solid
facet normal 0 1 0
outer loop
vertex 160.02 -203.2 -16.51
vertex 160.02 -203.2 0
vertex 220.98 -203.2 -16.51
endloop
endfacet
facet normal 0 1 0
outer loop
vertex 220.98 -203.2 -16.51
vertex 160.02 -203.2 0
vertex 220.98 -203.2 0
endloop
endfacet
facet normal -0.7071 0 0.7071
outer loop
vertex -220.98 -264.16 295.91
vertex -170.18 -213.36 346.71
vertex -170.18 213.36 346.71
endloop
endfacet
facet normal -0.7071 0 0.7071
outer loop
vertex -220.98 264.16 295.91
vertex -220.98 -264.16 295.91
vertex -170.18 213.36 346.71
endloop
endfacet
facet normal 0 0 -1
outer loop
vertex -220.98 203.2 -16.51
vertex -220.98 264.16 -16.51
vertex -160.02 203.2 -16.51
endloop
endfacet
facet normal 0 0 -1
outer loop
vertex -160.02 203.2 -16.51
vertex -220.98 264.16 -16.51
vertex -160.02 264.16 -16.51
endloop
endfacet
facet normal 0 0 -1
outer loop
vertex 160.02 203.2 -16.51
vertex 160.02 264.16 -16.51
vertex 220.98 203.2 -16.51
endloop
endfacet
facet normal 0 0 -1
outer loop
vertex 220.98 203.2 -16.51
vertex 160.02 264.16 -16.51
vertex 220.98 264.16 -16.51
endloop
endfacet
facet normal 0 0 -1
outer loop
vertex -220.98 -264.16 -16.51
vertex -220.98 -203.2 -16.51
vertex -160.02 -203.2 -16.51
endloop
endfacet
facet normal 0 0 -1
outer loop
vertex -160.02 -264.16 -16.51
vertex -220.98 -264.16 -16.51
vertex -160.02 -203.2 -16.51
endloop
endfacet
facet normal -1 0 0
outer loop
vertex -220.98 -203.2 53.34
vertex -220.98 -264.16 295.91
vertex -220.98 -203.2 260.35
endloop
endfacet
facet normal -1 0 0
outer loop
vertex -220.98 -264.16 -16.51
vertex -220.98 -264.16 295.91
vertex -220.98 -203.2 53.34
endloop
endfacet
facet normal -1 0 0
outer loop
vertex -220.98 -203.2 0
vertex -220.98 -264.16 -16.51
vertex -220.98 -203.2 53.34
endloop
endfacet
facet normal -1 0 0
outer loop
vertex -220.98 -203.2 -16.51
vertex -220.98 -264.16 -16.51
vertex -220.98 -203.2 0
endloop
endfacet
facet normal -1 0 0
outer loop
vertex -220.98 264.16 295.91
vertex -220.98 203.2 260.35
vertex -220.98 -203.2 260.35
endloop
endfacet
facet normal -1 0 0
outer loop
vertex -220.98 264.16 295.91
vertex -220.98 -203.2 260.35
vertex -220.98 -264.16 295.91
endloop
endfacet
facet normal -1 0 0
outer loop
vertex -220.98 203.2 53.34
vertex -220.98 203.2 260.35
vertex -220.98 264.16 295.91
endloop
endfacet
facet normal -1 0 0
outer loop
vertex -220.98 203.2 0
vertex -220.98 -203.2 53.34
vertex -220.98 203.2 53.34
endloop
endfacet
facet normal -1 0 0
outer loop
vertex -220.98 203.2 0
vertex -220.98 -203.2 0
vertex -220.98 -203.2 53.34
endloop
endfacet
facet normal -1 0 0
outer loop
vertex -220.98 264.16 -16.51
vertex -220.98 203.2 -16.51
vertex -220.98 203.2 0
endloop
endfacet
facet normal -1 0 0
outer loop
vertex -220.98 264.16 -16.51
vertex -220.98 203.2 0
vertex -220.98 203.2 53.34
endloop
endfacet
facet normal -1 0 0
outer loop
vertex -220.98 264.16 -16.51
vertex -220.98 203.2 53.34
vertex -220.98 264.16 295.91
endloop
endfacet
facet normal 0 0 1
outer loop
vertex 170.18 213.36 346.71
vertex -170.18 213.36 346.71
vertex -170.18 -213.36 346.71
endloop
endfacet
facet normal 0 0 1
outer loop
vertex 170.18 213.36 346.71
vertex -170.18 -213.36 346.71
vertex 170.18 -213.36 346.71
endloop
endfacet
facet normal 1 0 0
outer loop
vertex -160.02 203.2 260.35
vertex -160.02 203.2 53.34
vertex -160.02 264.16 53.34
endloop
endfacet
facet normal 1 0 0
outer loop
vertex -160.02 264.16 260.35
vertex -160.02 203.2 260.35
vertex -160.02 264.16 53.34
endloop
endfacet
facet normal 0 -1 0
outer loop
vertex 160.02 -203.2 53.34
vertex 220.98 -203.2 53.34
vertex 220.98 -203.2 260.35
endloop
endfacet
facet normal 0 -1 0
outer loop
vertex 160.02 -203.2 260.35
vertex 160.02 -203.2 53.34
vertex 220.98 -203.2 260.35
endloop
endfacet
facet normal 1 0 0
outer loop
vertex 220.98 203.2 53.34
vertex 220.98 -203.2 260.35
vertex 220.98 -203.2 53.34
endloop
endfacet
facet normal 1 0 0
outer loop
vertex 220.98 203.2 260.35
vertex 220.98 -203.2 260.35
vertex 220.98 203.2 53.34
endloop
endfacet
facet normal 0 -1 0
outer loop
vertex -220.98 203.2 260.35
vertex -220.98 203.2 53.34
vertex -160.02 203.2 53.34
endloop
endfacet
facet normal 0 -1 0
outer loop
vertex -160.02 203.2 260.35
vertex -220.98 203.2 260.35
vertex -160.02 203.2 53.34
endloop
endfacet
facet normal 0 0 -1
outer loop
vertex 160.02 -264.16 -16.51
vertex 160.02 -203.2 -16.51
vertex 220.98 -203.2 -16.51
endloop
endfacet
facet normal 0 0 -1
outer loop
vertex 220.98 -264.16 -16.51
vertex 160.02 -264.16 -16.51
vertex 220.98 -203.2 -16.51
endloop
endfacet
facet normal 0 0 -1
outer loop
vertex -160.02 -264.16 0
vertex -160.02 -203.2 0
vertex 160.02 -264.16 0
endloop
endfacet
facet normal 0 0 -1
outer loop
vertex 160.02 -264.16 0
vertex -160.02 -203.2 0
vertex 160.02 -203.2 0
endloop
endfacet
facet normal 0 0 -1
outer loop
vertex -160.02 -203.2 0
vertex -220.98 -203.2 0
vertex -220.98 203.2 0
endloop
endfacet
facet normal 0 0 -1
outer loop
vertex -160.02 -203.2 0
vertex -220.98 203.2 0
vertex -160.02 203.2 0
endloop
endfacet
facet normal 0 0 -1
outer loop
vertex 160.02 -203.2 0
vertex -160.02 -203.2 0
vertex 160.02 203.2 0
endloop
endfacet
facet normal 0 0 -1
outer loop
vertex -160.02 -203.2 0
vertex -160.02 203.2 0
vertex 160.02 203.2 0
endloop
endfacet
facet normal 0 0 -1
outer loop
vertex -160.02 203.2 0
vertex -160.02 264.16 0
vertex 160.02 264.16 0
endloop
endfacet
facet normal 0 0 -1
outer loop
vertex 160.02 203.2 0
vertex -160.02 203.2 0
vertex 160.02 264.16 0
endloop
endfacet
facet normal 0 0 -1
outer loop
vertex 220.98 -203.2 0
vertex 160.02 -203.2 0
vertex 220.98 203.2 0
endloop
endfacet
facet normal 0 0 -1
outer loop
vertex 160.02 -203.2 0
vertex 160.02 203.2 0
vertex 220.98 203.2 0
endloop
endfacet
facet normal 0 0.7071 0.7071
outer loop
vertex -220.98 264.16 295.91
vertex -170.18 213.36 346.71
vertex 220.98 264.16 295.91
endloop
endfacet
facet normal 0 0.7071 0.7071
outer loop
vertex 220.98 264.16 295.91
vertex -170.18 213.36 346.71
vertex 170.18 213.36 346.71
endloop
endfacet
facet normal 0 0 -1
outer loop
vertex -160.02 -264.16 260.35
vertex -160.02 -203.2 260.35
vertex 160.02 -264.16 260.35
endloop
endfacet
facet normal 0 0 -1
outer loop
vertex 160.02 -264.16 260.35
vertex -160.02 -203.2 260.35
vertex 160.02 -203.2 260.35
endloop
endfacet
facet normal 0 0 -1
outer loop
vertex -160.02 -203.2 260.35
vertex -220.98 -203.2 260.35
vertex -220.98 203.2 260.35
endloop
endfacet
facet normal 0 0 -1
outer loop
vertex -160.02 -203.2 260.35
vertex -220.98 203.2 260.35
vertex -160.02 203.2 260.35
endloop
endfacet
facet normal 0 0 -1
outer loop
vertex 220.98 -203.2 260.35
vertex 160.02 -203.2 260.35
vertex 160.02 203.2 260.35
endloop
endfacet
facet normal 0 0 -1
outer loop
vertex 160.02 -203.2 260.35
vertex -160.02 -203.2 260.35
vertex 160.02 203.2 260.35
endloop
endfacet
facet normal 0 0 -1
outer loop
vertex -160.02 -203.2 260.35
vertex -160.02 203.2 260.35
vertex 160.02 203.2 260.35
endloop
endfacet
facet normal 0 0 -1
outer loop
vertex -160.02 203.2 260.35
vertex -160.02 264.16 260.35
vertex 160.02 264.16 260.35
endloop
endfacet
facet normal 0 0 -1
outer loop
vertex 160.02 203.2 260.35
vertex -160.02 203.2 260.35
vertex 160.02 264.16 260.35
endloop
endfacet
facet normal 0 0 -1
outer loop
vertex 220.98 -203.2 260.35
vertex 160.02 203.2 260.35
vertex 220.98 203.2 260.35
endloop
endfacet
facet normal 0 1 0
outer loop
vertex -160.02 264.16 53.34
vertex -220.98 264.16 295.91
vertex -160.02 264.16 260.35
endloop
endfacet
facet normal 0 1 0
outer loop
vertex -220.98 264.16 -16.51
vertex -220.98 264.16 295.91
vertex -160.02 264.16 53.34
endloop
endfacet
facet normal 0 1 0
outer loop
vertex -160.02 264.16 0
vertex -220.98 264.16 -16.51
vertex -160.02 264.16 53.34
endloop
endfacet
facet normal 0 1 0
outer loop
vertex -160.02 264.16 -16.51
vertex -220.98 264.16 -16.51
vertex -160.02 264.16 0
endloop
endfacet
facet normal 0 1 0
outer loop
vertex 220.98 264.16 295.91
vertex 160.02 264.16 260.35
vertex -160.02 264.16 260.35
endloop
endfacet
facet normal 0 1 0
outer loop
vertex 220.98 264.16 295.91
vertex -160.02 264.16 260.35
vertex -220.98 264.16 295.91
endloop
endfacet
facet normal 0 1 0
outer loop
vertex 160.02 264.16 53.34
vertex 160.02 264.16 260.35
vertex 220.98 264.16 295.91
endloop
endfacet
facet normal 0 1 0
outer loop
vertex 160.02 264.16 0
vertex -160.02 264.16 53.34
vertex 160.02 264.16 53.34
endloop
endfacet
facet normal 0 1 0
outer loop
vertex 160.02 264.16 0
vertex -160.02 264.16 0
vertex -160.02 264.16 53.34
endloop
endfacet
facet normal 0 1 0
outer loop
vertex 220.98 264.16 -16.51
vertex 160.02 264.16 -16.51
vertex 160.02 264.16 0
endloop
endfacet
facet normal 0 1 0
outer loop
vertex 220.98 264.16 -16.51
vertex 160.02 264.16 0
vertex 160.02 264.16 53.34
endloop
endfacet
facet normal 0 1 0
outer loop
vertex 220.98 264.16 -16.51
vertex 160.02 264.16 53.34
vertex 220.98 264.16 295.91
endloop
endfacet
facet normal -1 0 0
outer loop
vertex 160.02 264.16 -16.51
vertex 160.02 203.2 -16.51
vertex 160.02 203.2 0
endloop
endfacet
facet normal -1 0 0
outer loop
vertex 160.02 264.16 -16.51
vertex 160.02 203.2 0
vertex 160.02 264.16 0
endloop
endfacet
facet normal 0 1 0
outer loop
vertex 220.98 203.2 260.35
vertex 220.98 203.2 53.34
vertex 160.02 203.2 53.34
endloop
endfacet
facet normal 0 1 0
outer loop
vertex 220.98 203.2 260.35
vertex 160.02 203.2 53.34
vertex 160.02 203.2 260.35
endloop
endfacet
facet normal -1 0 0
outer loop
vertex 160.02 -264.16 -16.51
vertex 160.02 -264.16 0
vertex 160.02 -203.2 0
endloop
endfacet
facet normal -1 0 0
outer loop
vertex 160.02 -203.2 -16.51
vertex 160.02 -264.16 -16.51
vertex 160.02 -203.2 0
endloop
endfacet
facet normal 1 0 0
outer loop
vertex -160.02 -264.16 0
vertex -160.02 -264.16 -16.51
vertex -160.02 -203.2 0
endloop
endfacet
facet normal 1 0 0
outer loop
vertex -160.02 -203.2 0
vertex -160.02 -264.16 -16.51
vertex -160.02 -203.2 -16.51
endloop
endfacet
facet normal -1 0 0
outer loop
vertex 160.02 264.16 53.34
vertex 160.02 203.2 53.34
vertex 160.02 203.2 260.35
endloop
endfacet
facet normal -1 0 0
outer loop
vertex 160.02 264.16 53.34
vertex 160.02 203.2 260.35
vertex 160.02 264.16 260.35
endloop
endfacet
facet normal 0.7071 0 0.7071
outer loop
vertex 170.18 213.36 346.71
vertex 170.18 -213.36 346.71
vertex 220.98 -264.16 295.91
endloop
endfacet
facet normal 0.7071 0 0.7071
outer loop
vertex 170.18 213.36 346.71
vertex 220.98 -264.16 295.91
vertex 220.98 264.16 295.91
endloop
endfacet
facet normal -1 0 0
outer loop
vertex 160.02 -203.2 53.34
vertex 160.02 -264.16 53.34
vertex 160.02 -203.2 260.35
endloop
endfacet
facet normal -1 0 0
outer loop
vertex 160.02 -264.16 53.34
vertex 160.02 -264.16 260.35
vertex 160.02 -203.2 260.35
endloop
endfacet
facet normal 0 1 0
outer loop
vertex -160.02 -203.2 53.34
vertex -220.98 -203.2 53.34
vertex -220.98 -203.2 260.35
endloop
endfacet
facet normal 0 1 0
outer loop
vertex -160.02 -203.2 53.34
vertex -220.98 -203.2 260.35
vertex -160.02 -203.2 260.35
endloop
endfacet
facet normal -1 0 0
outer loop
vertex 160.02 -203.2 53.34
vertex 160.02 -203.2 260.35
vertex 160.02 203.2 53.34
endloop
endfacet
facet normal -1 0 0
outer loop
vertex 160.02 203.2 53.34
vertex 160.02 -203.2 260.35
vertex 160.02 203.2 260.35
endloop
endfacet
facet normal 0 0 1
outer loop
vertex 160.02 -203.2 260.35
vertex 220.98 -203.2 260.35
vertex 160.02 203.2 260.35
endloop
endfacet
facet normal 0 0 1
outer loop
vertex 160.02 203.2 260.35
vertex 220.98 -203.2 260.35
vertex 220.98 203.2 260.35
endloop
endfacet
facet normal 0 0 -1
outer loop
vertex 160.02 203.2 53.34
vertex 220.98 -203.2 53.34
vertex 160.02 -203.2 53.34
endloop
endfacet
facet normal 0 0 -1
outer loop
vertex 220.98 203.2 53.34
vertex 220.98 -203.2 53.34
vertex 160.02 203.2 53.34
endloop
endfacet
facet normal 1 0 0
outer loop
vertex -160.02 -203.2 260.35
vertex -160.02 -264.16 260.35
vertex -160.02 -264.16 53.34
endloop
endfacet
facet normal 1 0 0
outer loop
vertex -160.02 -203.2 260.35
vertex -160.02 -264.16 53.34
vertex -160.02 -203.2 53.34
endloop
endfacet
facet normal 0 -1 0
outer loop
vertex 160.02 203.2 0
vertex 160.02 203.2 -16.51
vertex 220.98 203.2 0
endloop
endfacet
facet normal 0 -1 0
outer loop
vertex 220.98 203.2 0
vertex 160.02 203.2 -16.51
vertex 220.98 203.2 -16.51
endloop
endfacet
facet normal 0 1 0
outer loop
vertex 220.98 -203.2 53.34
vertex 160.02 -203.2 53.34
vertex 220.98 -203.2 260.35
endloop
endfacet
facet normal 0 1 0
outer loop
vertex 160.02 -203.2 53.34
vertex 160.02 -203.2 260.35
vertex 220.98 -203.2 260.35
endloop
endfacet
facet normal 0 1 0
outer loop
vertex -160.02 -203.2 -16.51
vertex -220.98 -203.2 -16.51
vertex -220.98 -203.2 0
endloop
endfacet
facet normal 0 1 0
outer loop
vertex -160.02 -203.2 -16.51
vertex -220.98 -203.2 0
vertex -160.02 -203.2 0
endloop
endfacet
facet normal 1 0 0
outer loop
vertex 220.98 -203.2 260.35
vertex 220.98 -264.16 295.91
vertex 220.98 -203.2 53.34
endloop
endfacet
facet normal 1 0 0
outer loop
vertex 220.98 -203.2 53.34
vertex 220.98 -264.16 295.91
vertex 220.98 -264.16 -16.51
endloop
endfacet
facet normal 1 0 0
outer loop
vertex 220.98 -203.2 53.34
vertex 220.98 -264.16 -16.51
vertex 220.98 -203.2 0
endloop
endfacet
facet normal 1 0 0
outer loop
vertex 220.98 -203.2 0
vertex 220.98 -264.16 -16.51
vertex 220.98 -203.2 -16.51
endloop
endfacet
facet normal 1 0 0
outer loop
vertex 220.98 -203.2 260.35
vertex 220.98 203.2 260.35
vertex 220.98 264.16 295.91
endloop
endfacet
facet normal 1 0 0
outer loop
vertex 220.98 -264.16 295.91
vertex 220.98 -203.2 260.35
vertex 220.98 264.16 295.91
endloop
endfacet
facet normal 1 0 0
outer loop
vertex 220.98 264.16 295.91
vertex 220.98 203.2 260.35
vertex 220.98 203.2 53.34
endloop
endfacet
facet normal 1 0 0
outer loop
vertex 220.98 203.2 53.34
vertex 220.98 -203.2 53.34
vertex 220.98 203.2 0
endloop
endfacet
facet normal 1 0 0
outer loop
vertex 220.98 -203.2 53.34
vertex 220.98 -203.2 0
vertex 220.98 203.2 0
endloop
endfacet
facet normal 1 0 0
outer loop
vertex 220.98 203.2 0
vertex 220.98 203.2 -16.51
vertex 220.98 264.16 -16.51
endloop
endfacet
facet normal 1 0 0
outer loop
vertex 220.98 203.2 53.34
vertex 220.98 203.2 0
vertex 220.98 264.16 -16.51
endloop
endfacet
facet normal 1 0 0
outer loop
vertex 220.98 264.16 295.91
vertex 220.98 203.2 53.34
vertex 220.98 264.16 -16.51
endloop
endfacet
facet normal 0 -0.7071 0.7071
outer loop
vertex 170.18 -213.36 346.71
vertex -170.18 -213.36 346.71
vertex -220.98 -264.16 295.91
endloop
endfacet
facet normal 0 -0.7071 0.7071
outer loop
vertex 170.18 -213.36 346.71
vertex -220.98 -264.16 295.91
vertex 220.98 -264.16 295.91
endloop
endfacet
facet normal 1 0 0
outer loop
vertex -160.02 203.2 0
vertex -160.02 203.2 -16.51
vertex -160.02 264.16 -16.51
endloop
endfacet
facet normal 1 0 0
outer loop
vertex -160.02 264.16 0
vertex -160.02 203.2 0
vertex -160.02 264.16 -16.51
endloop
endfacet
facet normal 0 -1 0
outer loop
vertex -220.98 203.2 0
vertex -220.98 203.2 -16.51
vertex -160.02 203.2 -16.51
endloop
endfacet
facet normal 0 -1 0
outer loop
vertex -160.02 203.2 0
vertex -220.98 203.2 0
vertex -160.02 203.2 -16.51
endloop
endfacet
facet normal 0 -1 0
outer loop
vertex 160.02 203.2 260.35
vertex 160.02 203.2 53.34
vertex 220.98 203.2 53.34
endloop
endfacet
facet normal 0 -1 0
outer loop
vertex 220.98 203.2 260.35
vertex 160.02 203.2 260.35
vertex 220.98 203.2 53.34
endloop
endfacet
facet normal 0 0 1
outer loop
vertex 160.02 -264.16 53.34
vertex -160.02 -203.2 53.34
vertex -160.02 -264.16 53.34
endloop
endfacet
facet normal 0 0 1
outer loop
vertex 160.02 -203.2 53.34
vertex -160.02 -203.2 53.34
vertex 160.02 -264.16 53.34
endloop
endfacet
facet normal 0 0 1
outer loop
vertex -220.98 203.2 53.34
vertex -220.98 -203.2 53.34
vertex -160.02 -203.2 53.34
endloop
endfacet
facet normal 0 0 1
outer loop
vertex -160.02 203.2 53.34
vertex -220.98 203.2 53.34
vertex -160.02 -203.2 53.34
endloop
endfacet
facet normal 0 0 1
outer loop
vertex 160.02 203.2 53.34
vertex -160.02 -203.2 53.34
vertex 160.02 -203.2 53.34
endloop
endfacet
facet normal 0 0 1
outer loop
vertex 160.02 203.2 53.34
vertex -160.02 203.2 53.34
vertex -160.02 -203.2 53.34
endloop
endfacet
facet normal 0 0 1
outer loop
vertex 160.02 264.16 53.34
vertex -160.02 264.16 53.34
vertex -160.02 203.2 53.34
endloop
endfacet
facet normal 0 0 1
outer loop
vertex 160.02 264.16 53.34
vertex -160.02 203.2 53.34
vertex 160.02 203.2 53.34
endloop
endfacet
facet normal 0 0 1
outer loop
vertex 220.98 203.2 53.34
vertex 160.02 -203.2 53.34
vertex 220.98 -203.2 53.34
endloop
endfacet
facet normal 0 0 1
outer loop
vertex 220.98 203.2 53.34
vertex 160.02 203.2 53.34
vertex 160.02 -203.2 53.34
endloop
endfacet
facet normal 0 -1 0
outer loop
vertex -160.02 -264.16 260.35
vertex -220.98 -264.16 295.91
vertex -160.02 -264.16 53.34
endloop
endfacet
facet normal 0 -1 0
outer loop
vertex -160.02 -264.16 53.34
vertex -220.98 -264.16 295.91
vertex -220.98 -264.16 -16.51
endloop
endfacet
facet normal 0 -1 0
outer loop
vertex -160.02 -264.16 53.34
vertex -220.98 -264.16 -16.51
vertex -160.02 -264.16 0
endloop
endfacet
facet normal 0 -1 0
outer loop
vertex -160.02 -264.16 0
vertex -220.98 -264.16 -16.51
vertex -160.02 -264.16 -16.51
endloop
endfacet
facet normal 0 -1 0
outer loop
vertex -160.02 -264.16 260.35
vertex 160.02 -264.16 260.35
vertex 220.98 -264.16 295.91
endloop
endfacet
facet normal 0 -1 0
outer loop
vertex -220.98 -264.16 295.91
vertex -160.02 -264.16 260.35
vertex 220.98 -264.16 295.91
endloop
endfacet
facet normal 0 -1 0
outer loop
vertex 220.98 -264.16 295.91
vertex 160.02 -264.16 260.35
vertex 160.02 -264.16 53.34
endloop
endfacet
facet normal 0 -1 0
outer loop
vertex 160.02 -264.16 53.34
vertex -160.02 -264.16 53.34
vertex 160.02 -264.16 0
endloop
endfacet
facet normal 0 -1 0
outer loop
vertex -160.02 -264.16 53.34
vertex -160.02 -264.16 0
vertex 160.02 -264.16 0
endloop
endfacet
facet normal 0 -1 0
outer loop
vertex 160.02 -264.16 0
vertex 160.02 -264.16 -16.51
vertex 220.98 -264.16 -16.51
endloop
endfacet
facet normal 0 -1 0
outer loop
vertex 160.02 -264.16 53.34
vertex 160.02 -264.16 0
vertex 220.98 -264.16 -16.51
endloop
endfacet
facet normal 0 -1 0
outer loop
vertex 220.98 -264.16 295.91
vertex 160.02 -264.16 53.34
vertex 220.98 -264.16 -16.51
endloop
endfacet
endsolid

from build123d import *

# Parameters (mm, degrees)
F0_W      = 220.98
F0_H      = 264.16
F1_DEPTH  = 53.34
F2_W      = 60.96
F2_H      = 60.96
F3_DEPTH  = 69.85
F4_W      = 60.96
F4_H      = 60.96
F5_DEPTH  = 137.16
F6_W      = 60.96
F6_H      = 60.96
F7_DEPTH  = 7.62
F8_W      = 441.96
F8_H      = 528.32
F9_DEPTH  = 78.74
F10_SIZE  = 50.8
F11_W     = 406.4
F11_H     = 207.01
F12_DEPTH = 60.96


with BuildPart() as f1:
    # F0 (on Top) → F1 (new body)
    with BuildSketch(Plane.XY):
        with Locations((110.49, -132.08)):
            Rectangle(F0_W, F0_H)
        with Locations((110.49, 132.08)):
            Rectangle(F0_W, F0_H)
        with Locations((-110.49, 132.08)):
            Rectangle(F0_W, F0_H)
        with Locations((-110.49, -132.08)):
            Rectangle(F0_W, F0_H)
    extrude(amount=F1_DEPTH)

    # F2 (on face) → F3 (join, symmetric)
    with BuildSketch(Plane.XY.offset(53.34)):
        with Locations((-190.5, -233.68)):
            Rectangle(F2_W, F2_H)
        with Locations((-190.5, 233.68)):
            Rectangle(F2_W, F2_H)
        with Locations((190.5, 233.68)):
            Rectangle(F2_W, F2_H)
        with Locations((190.5, -233.68)):
            Rectangle(F2_W, F2_H)
    extrude(amount=F3_DEPTH, both=True)

    # F4 (on face) → F5 (join)
    with BuildSketch(Plane.XY.offset(123.19)):
        with Locations((-190.5, -233.68)):
            Rectangle(F4_W, F4_H)
        with Locations((-190.5, 233.68)):
            Rectangle(F4_W, F4_H)
        with Locations((190.5, 233.68)):
            Rectangle(F4_W, F4_H)
        with Locations((190.5, -233.68)):
            Rectangle(F4_W, F4_H)
    extrude(amount=F5_DEPTH)

    # F6 (on face) → F7 (join)
    with BuildSketch(Plane.XY.offset(260.35)):
        Polygon((-160.02, 264.16), (-160.02, 203.2), (-220.98, 203.2), (-220.98, -203.2), (-160.02, -203.2), (-160.02, -264.16), (160.02, -264.16), (160.02, -203.2), (220.98, -203.2), (220.98, 203.2), (160.02, 203.2), (160.02, 264.16), align=None)
        with Locations((-190.5, 233.68)):
            Rectangle(F6_W, F6_H)
        with Locations((-190.5, -233.68)):
            Rectangle(F6_W, F6_H)
        with Locations((190.5, 233.68)):
            Rectangle(F6_W, F6_H)
        with Locations((190.5, -233.68)):
            Rectangle(F6_W, F6_H)
    extrude(amount=F7_DEPTH)

    # F8 (on face) → F9 (join)
    with BuildSketch(Plane.XY.offset(267.97)):
        Rectangle(F8_W, F8_H)
    extrude(amount=F9_DEPTH)

    # F10
    f10_edges = [f1.edges().sort_by_distance(p)[0] for p in [
        (-220.98, 0, 346.71),
        (0, 264.16, 346.71),
        (220.98, 0, 346.71),
        (0, -264.16, 346.71),
    ]]
    chamfer(f10_edges, length=F10_SIZE)


with BuildPart() as f12:
    # F11 (on face) → F12 (new body)
    with BuildSketch(Plane.YZ.offset(220.98)):
        with Locations((0, 156.845)):
            Rectangle(F11_W, F11_H)
    extrude(amount=-F12_DEPTH)


solid = Compound([f1.part, f12.part])
